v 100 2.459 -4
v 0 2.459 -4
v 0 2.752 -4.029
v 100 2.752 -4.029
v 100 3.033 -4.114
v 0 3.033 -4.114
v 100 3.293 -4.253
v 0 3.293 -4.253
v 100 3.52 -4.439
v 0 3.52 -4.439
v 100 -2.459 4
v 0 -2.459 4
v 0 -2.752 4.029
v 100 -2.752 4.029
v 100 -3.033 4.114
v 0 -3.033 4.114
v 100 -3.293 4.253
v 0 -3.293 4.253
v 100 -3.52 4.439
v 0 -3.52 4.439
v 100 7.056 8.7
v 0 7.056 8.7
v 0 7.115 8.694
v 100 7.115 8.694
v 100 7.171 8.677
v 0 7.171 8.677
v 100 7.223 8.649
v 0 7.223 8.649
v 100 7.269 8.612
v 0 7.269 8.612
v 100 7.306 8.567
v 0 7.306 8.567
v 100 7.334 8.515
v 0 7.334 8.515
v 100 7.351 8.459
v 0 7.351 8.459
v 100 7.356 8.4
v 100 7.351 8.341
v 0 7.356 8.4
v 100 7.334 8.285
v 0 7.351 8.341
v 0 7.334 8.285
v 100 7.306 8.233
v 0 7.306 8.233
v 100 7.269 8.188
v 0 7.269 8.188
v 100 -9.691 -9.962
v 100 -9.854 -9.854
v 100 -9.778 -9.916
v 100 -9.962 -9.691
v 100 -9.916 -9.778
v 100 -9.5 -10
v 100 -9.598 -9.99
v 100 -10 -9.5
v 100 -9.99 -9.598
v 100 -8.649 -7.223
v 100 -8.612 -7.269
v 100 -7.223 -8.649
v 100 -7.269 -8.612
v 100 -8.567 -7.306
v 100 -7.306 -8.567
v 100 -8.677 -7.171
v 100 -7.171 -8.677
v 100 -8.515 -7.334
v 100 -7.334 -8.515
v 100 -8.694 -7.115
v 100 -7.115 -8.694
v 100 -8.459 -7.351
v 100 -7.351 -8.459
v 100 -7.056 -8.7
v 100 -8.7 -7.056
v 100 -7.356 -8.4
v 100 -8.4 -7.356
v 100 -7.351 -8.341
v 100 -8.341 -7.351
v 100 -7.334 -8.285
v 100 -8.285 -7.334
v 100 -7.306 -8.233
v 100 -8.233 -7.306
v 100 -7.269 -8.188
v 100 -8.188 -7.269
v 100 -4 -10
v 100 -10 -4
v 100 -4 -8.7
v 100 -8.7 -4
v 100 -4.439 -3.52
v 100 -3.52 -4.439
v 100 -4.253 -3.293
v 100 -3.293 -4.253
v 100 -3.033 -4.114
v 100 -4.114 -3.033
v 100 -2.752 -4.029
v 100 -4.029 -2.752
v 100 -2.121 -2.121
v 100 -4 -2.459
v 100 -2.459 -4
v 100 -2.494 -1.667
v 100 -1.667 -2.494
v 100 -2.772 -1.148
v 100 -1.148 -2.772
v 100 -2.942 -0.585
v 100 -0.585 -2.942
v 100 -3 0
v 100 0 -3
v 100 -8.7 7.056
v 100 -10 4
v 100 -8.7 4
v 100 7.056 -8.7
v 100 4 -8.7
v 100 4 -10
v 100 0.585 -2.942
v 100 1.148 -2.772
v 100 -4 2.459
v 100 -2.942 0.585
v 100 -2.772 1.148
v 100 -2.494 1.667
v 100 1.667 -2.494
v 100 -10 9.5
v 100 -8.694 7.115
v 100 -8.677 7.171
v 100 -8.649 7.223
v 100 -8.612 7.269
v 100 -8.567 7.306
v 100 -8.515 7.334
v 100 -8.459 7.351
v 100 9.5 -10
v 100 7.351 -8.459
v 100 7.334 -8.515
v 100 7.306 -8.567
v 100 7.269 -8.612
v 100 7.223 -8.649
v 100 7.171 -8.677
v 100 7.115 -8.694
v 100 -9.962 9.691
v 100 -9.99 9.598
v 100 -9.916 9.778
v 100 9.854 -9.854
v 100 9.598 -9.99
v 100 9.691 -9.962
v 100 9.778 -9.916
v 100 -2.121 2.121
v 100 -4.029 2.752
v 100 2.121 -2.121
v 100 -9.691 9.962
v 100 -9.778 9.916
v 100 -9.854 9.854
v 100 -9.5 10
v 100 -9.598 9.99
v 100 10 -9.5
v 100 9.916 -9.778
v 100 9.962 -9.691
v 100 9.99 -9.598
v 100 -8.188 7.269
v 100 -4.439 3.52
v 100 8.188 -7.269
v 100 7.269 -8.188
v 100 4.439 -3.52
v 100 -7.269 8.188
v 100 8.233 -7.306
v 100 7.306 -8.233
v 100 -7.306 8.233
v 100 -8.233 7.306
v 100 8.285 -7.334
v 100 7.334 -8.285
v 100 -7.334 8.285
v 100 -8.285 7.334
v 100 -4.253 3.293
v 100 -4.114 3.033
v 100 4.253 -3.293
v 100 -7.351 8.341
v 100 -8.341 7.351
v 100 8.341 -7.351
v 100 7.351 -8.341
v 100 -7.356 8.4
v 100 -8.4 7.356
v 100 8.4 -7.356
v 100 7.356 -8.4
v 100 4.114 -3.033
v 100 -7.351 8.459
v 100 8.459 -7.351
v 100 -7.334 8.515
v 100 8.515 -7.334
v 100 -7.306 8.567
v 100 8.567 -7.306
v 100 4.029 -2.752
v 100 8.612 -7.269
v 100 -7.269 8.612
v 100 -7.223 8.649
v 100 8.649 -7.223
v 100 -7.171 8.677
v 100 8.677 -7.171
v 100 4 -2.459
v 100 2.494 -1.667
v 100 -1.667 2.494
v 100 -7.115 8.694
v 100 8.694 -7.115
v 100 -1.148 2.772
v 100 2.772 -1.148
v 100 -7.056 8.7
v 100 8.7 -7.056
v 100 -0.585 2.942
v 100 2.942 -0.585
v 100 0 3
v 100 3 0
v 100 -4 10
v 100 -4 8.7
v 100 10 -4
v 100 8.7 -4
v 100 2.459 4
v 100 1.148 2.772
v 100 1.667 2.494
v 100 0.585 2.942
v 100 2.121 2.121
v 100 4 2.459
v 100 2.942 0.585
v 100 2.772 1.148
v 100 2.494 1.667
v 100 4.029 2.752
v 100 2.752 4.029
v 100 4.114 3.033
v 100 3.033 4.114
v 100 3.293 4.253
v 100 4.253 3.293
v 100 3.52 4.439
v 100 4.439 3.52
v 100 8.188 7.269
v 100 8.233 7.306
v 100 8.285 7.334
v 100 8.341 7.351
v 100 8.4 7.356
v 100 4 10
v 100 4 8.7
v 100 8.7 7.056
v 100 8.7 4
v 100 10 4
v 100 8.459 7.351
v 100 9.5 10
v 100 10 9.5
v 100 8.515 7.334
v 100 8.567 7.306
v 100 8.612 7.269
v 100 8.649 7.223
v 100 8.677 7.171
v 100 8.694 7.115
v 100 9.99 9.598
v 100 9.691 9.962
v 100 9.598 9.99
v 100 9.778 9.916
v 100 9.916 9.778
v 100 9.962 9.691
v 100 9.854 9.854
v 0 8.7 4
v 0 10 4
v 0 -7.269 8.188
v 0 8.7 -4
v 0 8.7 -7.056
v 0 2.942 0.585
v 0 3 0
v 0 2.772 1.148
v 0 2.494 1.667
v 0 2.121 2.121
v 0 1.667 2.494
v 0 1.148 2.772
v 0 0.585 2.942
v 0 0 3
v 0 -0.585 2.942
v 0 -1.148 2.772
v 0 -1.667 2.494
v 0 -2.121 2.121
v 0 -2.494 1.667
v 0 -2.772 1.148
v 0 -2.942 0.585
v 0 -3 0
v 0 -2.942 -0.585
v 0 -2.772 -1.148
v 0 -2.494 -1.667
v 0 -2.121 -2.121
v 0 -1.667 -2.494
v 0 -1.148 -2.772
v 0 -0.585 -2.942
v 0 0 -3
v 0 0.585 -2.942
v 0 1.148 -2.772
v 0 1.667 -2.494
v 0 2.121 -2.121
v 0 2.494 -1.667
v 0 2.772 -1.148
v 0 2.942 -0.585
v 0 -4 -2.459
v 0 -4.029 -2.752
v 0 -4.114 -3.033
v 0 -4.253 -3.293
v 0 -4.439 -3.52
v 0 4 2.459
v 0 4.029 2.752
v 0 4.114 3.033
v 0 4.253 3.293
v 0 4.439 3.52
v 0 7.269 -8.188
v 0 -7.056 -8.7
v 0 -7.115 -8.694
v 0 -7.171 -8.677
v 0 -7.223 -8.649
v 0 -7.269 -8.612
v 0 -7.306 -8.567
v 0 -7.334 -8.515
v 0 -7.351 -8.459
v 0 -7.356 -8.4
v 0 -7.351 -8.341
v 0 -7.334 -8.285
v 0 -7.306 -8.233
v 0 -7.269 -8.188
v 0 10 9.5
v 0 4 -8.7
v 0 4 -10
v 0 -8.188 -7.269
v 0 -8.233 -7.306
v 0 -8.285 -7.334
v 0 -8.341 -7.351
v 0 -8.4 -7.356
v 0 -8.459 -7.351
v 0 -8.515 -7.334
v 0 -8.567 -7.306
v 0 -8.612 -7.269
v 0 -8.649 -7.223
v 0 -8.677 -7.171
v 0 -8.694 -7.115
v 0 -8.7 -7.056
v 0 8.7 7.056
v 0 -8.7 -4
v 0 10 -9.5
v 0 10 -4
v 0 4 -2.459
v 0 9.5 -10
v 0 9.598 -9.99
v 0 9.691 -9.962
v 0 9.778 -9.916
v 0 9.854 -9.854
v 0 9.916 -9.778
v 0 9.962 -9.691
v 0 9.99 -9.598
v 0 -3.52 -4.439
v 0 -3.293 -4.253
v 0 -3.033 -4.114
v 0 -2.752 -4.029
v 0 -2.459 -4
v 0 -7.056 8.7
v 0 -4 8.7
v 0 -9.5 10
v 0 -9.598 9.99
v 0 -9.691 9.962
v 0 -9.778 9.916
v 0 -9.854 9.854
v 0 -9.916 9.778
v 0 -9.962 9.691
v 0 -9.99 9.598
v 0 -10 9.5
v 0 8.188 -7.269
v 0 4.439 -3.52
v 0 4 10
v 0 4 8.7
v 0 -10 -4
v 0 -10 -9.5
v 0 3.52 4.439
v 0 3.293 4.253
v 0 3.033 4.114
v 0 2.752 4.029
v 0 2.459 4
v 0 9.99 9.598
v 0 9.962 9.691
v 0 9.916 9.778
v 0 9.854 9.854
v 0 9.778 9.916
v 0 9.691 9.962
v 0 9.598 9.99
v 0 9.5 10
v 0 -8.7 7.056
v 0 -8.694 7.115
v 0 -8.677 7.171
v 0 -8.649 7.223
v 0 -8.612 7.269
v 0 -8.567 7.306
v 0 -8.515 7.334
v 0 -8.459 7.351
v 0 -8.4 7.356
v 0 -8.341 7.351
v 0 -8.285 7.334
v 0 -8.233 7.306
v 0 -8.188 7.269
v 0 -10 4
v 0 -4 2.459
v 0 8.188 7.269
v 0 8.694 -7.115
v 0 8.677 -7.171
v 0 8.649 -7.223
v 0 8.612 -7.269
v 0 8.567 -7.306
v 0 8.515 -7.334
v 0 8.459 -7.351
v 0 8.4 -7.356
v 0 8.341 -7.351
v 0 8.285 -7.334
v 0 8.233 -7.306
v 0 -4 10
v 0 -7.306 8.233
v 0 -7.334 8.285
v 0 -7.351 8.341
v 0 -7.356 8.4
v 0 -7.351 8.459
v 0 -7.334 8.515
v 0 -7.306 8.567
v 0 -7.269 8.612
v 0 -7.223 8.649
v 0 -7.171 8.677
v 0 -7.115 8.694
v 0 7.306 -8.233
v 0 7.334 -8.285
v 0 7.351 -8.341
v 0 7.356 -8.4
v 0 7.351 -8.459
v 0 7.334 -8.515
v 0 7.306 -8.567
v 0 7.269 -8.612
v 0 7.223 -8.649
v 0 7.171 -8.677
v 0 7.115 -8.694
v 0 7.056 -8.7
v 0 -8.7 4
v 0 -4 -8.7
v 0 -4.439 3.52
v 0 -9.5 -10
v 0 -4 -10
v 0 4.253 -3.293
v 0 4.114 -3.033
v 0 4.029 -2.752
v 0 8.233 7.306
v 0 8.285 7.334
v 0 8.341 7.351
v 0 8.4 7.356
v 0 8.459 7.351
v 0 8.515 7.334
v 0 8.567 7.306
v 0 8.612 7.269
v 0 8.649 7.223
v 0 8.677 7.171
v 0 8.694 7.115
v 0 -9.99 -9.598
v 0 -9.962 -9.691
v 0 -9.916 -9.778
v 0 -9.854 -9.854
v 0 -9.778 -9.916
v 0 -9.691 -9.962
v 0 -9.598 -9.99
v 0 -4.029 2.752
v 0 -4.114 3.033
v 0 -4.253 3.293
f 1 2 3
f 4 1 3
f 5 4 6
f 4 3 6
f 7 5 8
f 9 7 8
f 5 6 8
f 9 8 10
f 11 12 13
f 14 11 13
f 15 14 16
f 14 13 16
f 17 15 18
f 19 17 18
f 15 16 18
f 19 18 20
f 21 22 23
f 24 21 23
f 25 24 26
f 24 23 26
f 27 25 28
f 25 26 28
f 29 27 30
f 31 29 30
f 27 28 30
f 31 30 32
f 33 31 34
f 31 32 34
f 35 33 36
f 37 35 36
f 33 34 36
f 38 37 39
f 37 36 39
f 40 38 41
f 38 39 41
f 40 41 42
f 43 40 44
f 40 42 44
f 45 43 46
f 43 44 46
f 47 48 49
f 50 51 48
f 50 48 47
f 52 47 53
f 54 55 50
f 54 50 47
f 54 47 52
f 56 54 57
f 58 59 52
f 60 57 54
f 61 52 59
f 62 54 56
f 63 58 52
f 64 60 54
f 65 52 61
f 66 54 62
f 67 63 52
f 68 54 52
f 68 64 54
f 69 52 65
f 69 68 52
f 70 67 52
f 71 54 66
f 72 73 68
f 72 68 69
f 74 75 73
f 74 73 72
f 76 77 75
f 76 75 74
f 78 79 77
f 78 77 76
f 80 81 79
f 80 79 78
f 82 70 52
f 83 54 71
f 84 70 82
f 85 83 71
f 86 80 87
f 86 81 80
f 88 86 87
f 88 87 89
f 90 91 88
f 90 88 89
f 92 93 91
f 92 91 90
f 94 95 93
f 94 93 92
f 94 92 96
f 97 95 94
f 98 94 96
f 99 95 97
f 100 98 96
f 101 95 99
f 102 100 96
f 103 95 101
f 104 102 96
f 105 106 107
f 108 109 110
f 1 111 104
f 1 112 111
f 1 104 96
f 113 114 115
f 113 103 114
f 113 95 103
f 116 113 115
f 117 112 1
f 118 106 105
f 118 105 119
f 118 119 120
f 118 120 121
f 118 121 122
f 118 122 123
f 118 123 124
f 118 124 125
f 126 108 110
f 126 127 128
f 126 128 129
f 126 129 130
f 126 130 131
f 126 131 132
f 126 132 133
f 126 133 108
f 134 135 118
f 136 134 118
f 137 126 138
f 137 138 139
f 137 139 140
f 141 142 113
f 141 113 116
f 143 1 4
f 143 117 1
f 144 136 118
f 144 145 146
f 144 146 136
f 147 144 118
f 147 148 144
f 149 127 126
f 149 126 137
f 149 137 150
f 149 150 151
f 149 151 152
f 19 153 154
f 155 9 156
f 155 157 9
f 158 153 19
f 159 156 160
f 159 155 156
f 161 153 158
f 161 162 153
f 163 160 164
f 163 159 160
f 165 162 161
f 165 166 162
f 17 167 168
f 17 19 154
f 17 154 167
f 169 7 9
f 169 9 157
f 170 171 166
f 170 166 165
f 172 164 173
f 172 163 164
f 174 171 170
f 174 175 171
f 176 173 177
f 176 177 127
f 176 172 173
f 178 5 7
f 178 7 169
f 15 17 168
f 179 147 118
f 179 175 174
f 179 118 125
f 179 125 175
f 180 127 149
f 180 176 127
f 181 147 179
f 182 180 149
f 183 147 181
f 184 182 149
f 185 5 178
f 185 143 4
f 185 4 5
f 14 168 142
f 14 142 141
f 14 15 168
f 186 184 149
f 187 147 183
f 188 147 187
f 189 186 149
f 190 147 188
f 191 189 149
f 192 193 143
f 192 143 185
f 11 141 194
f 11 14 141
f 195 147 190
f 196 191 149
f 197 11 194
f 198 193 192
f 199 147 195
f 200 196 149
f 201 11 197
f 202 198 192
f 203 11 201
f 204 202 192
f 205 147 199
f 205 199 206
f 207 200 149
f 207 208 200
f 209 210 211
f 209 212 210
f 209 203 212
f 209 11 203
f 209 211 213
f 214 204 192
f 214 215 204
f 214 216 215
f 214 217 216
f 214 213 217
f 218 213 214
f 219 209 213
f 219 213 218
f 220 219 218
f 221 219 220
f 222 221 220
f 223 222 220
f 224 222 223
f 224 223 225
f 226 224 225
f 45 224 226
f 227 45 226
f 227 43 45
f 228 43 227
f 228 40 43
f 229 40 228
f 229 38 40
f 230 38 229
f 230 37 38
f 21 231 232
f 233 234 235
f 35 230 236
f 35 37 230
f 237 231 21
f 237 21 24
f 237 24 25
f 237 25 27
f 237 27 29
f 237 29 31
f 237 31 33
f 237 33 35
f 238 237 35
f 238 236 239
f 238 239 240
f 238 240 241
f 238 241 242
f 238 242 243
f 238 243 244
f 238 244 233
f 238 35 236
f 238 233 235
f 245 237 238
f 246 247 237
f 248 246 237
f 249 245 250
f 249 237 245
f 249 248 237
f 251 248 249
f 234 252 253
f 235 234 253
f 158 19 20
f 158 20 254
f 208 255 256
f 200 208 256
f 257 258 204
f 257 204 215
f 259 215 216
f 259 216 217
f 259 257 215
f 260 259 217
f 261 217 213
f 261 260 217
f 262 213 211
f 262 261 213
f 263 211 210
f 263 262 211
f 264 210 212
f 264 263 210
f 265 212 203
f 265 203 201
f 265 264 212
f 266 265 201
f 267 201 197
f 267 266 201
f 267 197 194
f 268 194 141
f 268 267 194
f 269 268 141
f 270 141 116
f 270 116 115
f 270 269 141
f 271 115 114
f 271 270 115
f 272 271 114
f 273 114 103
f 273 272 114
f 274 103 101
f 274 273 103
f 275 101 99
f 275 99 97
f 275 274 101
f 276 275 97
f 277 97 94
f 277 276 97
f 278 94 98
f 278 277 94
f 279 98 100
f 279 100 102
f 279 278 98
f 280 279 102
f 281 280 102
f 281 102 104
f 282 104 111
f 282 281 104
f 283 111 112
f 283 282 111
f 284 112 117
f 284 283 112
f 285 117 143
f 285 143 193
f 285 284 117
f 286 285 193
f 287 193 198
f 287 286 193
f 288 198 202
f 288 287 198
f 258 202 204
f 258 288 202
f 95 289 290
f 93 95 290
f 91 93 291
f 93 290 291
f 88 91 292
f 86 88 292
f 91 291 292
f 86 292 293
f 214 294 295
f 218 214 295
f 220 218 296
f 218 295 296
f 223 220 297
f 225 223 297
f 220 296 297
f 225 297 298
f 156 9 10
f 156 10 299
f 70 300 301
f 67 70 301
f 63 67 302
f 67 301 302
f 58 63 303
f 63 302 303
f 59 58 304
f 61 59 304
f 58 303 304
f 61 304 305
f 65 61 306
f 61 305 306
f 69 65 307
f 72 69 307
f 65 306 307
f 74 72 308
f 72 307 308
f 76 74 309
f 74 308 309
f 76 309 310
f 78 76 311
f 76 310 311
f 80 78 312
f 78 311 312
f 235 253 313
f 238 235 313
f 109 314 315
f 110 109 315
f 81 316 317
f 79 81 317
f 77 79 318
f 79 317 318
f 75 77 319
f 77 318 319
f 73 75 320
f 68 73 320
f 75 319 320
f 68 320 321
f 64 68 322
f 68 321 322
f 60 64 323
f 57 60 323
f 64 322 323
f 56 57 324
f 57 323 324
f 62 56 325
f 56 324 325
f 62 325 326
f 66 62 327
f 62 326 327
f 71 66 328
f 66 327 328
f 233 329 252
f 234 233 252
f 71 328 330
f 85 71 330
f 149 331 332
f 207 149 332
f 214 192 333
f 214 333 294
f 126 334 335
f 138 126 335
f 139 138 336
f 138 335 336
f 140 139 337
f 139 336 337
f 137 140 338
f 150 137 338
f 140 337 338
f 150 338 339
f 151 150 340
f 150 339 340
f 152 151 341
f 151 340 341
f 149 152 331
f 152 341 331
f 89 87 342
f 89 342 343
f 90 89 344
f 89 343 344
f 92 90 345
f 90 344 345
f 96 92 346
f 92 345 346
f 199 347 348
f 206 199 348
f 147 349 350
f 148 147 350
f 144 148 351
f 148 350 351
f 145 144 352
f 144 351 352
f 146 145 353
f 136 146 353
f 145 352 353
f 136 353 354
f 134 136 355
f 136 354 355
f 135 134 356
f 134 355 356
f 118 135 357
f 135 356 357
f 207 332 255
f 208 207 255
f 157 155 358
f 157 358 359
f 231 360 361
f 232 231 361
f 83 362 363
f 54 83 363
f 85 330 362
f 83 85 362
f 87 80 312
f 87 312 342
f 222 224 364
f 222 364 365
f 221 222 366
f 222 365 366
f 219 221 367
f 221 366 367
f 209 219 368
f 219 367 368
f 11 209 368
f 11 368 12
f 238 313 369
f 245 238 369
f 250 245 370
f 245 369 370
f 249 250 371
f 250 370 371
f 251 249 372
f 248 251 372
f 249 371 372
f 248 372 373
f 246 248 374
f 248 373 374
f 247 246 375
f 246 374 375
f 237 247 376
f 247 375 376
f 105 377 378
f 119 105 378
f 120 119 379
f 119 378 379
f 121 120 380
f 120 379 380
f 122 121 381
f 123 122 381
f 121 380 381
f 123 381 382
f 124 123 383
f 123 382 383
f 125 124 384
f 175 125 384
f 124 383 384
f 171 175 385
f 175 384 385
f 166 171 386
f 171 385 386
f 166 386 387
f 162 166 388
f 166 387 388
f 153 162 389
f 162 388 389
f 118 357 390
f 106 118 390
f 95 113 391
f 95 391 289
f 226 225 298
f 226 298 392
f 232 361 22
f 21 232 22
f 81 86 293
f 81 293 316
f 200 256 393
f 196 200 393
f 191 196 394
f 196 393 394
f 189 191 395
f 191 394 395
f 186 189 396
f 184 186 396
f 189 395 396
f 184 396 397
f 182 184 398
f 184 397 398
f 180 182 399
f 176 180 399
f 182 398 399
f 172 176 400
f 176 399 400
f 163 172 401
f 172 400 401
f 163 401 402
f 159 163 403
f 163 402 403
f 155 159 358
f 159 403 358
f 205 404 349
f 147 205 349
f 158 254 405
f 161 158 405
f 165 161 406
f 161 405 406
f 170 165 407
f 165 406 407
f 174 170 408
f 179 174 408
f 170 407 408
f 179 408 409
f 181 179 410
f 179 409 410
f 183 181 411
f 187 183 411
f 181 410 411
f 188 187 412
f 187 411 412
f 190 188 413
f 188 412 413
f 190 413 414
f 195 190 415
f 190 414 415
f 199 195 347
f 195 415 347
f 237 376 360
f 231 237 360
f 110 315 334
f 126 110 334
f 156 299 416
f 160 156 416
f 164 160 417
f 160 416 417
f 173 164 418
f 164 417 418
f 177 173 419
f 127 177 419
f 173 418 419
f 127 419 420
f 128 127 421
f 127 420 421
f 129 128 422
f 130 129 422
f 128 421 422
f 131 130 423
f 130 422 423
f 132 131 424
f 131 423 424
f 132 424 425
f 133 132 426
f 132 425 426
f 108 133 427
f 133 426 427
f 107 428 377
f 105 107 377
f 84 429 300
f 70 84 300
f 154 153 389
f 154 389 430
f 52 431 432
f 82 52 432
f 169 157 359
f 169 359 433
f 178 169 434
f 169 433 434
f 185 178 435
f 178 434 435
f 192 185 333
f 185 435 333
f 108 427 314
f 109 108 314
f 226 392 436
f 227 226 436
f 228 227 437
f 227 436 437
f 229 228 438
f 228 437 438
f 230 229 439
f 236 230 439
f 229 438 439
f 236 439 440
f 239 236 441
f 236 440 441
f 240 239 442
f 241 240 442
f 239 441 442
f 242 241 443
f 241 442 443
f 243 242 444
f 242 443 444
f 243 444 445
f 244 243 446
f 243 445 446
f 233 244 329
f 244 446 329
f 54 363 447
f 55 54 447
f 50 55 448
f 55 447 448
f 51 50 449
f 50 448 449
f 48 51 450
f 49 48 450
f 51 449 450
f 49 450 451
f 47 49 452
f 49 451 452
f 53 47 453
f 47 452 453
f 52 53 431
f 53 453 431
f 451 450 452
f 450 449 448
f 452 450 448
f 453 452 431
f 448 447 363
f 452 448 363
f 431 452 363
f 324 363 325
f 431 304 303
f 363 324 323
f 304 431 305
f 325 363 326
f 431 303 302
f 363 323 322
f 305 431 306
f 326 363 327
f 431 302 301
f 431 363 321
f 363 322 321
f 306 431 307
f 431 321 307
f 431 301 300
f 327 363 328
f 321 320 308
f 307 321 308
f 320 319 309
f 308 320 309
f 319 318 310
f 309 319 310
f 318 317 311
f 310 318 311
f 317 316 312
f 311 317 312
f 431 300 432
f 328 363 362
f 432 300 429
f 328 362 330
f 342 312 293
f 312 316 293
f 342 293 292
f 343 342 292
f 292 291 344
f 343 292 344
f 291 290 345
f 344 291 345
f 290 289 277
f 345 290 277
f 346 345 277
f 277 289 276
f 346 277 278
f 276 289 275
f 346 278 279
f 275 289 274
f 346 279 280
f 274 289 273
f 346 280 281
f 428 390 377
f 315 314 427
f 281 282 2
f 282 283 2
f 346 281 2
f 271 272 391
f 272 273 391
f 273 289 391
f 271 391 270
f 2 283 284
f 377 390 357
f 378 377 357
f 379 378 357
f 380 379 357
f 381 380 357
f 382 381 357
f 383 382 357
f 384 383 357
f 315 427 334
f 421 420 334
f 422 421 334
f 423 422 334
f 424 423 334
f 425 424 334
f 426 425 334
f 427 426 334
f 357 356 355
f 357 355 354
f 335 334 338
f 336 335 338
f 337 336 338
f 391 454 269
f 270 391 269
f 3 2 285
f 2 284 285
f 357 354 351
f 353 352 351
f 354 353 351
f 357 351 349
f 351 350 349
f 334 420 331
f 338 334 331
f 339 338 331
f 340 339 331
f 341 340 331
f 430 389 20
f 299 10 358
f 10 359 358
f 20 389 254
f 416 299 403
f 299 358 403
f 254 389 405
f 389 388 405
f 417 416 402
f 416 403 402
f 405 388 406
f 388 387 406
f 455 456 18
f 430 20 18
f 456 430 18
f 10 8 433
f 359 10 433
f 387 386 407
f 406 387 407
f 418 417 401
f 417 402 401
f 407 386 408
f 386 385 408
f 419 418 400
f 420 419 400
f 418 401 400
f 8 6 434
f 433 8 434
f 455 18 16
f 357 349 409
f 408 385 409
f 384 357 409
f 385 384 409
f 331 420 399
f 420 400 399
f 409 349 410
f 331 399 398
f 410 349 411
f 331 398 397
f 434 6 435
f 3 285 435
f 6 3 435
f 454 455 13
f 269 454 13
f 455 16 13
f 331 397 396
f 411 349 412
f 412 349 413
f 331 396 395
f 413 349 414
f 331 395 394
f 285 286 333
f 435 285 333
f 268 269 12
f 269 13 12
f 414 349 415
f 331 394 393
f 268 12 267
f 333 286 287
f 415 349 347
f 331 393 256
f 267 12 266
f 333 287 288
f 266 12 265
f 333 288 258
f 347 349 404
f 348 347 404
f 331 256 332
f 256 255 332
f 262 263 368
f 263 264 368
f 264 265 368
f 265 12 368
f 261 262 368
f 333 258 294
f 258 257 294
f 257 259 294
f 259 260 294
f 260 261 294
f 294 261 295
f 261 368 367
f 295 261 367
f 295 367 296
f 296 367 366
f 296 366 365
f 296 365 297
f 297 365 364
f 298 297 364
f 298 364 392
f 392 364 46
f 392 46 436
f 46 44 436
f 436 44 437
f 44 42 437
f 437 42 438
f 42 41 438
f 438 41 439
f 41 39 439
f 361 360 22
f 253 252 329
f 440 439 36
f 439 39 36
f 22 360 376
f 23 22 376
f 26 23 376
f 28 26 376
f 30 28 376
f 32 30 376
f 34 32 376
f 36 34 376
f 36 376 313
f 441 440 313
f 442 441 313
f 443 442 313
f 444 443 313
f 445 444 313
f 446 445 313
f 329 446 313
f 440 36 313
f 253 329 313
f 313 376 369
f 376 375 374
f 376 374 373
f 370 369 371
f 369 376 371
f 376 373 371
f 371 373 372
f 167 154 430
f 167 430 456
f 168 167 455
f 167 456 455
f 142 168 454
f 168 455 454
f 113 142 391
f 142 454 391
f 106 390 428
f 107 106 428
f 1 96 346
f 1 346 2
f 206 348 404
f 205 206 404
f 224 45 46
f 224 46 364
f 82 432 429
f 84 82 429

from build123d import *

# Parameters (mm, degrees)
SKETCH1_R                                   = 3
QUADRADO_PF20_01_PERFIL_2020_B_SICO_1_DEPTH = 100


with BuildPart() as part:
    # Sketch1 → Quadrado PF20-01 - PERFIL 2020 BÁSICO(1) (new body)
    with BuildSketch(Plane.YZ):
        with BuildLine():
            Line((8.187867966, -7.26862915), (4.439339828, -3.520101013))
            ThreePointArc((4.439339828, -3.520101013), (4.114180701, -3.033465989), (4, -2.459440841))
            Line((4, -2.459440841), (4, 2.459440841))
            ThreePointArc((4, 2.459440841), (4.114180701, 3.033465989), (4.439339828, 3.520101013))
            Line((4.439339828, 3.520101013), (8.187867966, 7.26862915))
            ThreePointArc((8.187867966, 7.26862915), (8.51480503, 7.333660975), (8.7, 7.056497116))
            Line((8.7, 7.056497116), (8.7, 4))
            Line((8.7, 4), (10, 4))
            Line((10, 4), (10, 9.5))
            ThreePointArc((10, 9.5), (9.853553391, 9.853553391), (9.5, 10))
            Line((9.5, 10), (4, 10))
            Line((4, 10), (4, 8.7))
            Line((4, 8.7), (7.056497116, 8.7))
            ThreePointArc((7.056497116, 8.7), (7.333660975, 8.51480503), (7.26862915, 8.187867966))
            Line((7.26862915, 8.187867966), (3.520101013, 4.439339828))
            ThreePointArc((3.520101013, 4.439339828), (3.033465989, 4.114180701), (2.459440841, 4))
            Line((2.459440841, 4), (-2.459440841, 4))
            ThreePointArc((-2.459440841, 4), (-3.033465989, 4.114180701), (-3.520101013, 4.439339828))
            Line((-3.520101013, 4.439339828), (-7.26862915, 8.187867966))
            ThreePointArc((-7.26862915, 8.187867966), (-7.333660975, 8.51480503), (-7.056497116, 8.7))
            Line((-7.056497116, 8.7), (-4, 8.7))
            Line((-4, 8.7), (-4, 10))
            Line((-4, 10), (-9.5, 10))
            ThreePointArc((-9.5, 10), (-9.853553391, 9.853553391), (-10, 9.5))
            Line((-10, 9.5), (-10, 4))
            Line((-10, 4), (-8.7, 4))
            Line((-8.7, 4), (-8.7, 7.056497116))
            ThreePointArc((-8.7, 7.056497116), (-8.51480503, 7.333660975), (-8.187867966, 7.26862915))
            Line((-8.187867966, 7.26862915), (-4.439339828, 3.520101013))
            ThreePointArc((-4.439339828, 3.520101013), (-4.114180701, 3.033465989), (-4, 2.459440841))
            Line((-4, 2.459440841), (-4, -2.459440841))
            ThreePointArc((-4, -2.459440841), (-4.114180701, -3.033465989), (-4.439339828, -3.520101013))
            Line((-4.439339828, -3.520101013), (-8.187867966, -7.26862915))
            ThreePointArc((-8.187867966, -7.26862915), (-8.51480503, -7.333660975), (-8.7, -7.056497116))
            Line((-8.7, -7.056497116), (-8.7, -4))
            Line((-8.7, -4), (-10, -4))
            Line((-10, -4), (-10, -9.5))
            ThreePointArc((-10, -9.5), (-9.853553391, -9.853553391), (-9.5, -10))
            Line((-9.5, -10), (-4, -10))
            Line((-4, -10), (-4, -8.7))
            Line((-4, -8.7), (-7.056497116, -8.7))
            ThreePointArc((-7.056497116, -8.7), (-7.333660975, -8.51480503), (-7.26862915, -8.187867966))
            Line((-7.26862915, -8.187867966), (-3.520101013, -4.439339828))
            ThreePointArc((-3.520101013, -4.439339828), (-3.033465989, -4.114180701), (-2.459440841, -4))
            Line((-2.459440841, -4), (2.459440841, -4))
            ThreePointArc((2.459440841, -4), (3.033465989, -4.114180701), (3.520101013, -4.439339828))
            Line((3.520101013, -4.439339828), (7.26862915, -8.187867966))
            ThreePointArc((7.26862915, -8.187867966), (7.333660975, -8.51480503), (7.056497116, -8.7))
            Line((7.056497116, -8.7), (4, -8.7))
            Line((4, -8.7), (4, -10))
            Line((4, -10), (9.5, -10))
            ThreePointArc((9.5, -10), (9.853553391, -9.853553391), (10, -9.5))
            Line((10, -9.5), (10, -4))
            Line((10, -4), (8.7, -4))
            Line((8.7, -4), (8.7, -7.056497116))
            ThreePointArc((8.7, -7.056497116), (8.51480503, -7.333660975), (8.187867966, -7.26862915))
        make_face()
        Circle(SKETCH1_R, mode=Mode.SUBTRACT)
    extrude(amount=QUADRADO_PF20_01_PERFIL_2020_B_SICO_1_DEPTH)


solid = part.part
